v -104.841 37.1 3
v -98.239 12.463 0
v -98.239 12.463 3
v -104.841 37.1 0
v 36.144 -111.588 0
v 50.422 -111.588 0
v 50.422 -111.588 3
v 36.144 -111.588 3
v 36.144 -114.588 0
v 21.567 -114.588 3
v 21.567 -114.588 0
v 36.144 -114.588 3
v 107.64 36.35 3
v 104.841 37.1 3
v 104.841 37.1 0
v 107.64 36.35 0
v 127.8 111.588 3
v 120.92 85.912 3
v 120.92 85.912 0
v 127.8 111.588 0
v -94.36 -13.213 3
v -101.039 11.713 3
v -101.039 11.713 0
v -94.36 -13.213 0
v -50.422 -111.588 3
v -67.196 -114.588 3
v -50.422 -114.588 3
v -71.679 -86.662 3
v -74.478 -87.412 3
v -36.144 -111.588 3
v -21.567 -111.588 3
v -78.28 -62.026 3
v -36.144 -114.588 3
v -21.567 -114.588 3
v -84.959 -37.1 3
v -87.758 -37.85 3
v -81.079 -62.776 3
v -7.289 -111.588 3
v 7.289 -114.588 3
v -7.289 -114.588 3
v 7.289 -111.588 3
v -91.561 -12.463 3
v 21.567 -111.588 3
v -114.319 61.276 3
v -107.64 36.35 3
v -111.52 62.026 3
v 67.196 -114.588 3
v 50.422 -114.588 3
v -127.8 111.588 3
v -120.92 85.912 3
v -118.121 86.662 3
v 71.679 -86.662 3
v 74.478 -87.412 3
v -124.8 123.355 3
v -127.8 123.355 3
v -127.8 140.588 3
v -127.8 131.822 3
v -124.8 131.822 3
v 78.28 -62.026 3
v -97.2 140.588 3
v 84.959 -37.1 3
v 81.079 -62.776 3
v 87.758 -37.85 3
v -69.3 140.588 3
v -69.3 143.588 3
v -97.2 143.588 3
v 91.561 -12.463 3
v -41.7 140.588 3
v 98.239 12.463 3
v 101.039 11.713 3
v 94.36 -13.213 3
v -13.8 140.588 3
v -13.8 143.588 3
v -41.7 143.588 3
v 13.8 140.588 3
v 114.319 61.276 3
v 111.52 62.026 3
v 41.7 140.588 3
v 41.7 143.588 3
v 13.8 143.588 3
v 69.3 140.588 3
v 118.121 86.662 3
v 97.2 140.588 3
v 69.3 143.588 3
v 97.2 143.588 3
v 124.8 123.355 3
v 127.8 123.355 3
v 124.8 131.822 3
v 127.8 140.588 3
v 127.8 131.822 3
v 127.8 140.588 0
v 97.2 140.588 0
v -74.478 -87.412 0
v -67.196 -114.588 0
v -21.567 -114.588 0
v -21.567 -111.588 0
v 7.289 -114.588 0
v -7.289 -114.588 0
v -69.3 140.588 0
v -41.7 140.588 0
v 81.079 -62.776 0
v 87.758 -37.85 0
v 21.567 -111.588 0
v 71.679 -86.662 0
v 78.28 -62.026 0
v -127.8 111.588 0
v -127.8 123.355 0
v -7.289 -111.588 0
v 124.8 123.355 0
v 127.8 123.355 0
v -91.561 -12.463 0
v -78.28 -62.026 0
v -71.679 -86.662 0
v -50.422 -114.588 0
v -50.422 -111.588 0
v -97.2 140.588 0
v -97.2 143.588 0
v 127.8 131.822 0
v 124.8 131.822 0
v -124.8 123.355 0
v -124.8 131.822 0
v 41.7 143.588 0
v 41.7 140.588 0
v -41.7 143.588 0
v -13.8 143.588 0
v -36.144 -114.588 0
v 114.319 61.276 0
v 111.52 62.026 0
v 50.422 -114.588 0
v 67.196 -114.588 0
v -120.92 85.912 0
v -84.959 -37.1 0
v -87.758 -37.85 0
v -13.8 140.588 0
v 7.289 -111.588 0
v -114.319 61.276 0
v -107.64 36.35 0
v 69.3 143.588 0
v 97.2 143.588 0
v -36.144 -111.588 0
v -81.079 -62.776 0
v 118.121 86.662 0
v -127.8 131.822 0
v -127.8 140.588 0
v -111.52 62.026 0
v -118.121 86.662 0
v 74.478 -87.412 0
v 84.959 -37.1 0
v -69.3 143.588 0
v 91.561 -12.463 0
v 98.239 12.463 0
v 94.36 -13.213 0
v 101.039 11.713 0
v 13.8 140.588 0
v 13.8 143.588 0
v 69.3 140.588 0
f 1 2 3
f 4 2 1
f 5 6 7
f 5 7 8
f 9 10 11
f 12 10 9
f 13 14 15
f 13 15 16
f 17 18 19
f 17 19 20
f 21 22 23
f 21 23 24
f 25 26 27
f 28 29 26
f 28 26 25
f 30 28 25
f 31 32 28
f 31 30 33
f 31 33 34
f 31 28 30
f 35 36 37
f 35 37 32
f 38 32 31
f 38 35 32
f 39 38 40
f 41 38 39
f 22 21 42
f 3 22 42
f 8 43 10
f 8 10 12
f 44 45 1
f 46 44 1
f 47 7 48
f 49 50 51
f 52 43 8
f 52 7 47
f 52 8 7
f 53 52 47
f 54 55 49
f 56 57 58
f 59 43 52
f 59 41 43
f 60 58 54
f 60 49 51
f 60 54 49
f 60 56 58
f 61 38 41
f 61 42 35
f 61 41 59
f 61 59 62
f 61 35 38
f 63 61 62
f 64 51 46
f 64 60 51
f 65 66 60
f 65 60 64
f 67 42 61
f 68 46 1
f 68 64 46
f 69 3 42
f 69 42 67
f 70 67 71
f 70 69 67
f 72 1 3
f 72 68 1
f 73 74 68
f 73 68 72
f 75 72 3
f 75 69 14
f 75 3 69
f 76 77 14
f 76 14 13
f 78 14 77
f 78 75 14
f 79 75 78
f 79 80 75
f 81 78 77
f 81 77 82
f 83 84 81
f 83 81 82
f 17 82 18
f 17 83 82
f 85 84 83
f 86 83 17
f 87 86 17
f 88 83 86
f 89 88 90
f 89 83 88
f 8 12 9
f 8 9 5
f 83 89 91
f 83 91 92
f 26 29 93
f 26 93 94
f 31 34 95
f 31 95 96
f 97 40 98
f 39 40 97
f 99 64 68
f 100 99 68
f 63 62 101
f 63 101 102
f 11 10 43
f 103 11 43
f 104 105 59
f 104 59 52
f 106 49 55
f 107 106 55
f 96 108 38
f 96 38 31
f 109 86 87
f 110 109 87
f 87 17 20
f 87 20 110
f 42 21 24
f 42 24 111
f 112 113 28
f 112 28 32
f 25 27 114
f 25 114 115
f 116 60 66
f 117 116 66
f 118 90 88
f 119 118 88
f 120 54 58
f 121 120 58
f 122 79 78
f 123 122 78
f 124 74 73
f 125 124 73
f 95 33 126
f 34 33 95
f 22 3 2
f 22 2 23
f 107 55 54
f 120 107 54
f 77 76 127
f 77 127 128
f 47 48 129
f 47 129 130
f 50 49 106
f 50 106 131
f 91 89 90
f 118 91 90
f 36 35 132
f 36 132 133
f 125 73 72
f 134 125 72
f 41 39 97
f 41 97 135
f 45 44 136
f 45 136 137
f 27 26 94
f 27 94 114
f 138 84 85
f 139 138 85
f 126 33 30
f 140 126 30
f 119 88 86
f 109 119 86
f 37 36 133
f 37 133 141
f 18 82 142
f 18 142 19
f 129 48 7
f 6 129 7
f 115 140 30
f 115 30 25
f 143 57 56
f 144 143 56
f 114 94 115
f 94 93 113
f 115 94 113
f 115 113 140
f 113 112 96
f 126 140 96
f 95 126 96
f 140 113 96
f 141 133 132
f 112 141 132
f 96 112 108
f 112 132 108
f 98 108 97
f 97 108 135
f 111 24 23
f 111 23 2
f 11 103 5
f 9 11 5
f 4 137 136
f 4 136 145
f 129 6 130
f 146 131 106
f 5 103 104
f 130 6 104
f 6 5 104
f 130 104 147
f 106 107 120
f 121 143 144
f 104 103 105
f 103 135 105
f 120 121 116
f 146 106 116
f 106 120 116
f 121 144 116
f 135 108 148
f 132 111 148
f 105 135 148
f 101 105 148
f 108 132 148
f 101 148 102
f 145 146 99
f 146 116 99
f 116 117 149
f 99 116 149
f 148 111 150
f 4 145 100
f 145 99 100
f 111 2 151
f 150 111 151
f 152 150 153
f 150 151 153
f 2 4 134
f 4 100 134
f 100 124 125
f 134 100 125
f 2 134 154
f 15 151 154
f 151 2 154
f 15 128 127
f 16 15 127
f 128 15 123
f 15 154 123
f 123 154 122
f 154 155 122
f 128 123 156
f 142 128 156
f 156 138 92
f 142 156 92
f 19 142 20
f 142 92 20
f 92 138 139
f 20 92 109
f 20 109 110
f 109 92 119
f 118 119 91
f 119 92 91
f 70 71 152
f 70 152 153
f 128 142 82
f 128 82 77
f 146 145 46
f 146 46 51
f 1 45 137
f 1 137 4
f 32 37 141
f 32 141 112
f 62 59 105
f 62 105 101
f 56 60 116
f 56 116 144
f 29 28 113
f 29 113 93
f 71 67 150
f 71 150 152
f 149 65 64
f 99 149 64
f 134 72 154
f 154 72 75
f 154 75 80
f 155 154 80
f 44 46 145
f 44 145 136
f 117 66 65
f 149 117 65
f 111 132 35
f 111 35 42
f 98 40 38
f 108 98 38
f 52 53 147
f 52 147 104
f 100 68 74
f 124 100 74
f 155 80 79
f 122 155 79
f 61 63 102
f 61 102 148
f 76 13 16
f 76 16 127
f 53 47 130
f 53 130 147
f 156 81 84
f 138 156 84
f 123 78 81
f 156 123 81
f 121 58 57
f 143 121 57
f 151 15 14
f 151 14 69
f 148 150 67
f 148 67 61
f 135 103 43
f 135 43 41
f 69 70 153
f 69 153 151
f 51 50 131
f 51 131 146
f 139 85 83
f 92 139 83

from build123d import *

# Parameters (mm, degrees)
BOSS_EXTRUDE1_DEPTH = 3
SKETCH2_W           = 249.6
SKETCH2_H           = 3
SKETCH2_W_2         = 14.577777778
SKETCH2_W_3         = 14.577777777
BOSS_EXTRUDE2_DEPTH = 3
BOSS_EXTRUDE5_DEPTH = 3
BOSS_EXTRUDE4_DEPTH = 3


with BuildPart() as part:
    # Sketch1 → Boss-Extrude1 (new body)
    with BuildSketch(Plane.XY):
        Polygon((-124.8, 111.588319146), (124.8, 111.588319146), (65, -111.588319146), (-65, -111.588319146), align=None)
    extrude(amount=BOSS_EXTRUDE1_DEPTH)

    # Sketch2 → Boss-Extrude2 (add, through all)
    with BuildSketch(Plane.XY.offset(3)):
        with Locations((0, 113.088319146)):
            Rectangle(SKETCH2_W, SKETCH2_H)
        with Locations((-57.711111111, -113.088319146)):
            Rectangle(SKETCH2_W_2, SKETCH2_H)
        with Locations((-28.855555556, -113.088319146)):
            Rectangle(SKETCH2_W_3, SKETCH2_H)
        with Locations((0, -113.088319146)):
            Rectangle(SKETCH2_W_2, SKETCH2_H)
        with Locations((28.855555556, -113.088319146)):
            Rectangle(SKETCH2_W_3, SKETCH2_H)
        with Locations((57.711111111, -113.088319146)):
            Rectangle(SKETCH2_W_2, SKETCH2_H)
    extrude(amount=-BOSS_EXTRUDE2_DEPTH)

    # Sketch4 → Boss-Extrude5 (add, through all)
    with BuildSketch(Plane.XY.offset(3)):
        Polygon((-124.8, 140.588319146), (-97.2, 140.588319146), (-97.2, 143.588319146), (-69.3, 143.588319146), (-69.3, 140.588319146), (-41.7, 140.588319146), (-41.7, 143.588319146), (-13.8, 143.588319146), (-13.8, 140.588319146), (13.8, 140.588319146), (13.8, 143.588319146), (41.7, 143.588319146), (41.7, 140.588319146), (69.3, 140.588319146), (69.3, 143.588319146), (97.2, 143.588319146), (97.2, 140.588319146), (124.8, 140.588319146), (127.8, 140.588319146), (127.8, 131.82165248), (124.8, 131.82165248), (124.8, 123.354985813), (127.8, 123.354985813), (127.8, 114.588319146), (124.8, 114.588319146), (-124.8, 114.588319146), (-127.8, 114.588319146), (-127.8, 123.354985813), (-124.8, 123.354985813), (-124.8, 131.82165248), (-127.8, 131.82165248), (-127.8, 140.588319146), align=None)
    extrude(amount=-BOSS_EXTRUDE5_DEPTH)

    # Sketch3 → Boss-Extrude4 (add, through all)
    with BuildSketch(Plane.XY.offset(3)):
        Polygon((127.8, 114.588319146), (124.8, 114.588319146), (124.8, 111.588319146), (118.12104635, 86.662124781), (120.920084455, 85.912124781), (127.8, 111.588319146), align=None)
        Polygon((74.477991756, -87.412124781), (71.67895365, -86.662124781), (65, -111.588319146), (65, -114.588319146), (67.196152423, -114.588319146), align=None)
        Polygon((87.758253344, -37.849513799), (84.959215238, -37.099513799), (78.280261587, -62.025708164), (81.079299693, -62.775708164), align=None)
        Polygon((101.038514931, 11.713097182), (98.239476825, 12.463097182), (91.560523175, -12.463097182), (94.35956128, -13.213097182), align=None)
        Polygon((114.318776518, 61.275708164), (111.519738413, 62.025708164), (104.840784762, 37.099513799), (107.639822868, 36.349513799), align=None)
        Polygon((-65, -111.588319146), (-71.67895365, -86.662124781), (-74.477991756, -87.412124781), (-67.196152423, -114.588319146), (-65, -114.588319146), align=None)
        Polygon((-78.280261587, -62.025708164), (-84.959215238, -37.099513799), (-87.758253344, -37.849513799), (-81.079299693, -62.775708164), align=None)
        Polygon((-91.560523175, -12.463097182), (-98.239476825, 12.463097182), (-101.038514931, 11.713097182), (-94.35956128, -13.213097182), align=None)
        Polygon((-104.840784762, 37.099513799), (-111.519738413, 62.025708164), (-114.318776518, 61.275708164), (-107.639822868, 36.349513799), align=None)
        Polygon((-127.8, 111.588319146), (-120.920084455, 85.912124781), (-118.12104635, 86.662124781), (-124.8, 111.588319146), (-124.8, 114.588319146), (-127.8, 114.588319146), align=None)
    extrude(amount=-BOSS_EXTRUDE4_DEPTH)


solid = part.part
